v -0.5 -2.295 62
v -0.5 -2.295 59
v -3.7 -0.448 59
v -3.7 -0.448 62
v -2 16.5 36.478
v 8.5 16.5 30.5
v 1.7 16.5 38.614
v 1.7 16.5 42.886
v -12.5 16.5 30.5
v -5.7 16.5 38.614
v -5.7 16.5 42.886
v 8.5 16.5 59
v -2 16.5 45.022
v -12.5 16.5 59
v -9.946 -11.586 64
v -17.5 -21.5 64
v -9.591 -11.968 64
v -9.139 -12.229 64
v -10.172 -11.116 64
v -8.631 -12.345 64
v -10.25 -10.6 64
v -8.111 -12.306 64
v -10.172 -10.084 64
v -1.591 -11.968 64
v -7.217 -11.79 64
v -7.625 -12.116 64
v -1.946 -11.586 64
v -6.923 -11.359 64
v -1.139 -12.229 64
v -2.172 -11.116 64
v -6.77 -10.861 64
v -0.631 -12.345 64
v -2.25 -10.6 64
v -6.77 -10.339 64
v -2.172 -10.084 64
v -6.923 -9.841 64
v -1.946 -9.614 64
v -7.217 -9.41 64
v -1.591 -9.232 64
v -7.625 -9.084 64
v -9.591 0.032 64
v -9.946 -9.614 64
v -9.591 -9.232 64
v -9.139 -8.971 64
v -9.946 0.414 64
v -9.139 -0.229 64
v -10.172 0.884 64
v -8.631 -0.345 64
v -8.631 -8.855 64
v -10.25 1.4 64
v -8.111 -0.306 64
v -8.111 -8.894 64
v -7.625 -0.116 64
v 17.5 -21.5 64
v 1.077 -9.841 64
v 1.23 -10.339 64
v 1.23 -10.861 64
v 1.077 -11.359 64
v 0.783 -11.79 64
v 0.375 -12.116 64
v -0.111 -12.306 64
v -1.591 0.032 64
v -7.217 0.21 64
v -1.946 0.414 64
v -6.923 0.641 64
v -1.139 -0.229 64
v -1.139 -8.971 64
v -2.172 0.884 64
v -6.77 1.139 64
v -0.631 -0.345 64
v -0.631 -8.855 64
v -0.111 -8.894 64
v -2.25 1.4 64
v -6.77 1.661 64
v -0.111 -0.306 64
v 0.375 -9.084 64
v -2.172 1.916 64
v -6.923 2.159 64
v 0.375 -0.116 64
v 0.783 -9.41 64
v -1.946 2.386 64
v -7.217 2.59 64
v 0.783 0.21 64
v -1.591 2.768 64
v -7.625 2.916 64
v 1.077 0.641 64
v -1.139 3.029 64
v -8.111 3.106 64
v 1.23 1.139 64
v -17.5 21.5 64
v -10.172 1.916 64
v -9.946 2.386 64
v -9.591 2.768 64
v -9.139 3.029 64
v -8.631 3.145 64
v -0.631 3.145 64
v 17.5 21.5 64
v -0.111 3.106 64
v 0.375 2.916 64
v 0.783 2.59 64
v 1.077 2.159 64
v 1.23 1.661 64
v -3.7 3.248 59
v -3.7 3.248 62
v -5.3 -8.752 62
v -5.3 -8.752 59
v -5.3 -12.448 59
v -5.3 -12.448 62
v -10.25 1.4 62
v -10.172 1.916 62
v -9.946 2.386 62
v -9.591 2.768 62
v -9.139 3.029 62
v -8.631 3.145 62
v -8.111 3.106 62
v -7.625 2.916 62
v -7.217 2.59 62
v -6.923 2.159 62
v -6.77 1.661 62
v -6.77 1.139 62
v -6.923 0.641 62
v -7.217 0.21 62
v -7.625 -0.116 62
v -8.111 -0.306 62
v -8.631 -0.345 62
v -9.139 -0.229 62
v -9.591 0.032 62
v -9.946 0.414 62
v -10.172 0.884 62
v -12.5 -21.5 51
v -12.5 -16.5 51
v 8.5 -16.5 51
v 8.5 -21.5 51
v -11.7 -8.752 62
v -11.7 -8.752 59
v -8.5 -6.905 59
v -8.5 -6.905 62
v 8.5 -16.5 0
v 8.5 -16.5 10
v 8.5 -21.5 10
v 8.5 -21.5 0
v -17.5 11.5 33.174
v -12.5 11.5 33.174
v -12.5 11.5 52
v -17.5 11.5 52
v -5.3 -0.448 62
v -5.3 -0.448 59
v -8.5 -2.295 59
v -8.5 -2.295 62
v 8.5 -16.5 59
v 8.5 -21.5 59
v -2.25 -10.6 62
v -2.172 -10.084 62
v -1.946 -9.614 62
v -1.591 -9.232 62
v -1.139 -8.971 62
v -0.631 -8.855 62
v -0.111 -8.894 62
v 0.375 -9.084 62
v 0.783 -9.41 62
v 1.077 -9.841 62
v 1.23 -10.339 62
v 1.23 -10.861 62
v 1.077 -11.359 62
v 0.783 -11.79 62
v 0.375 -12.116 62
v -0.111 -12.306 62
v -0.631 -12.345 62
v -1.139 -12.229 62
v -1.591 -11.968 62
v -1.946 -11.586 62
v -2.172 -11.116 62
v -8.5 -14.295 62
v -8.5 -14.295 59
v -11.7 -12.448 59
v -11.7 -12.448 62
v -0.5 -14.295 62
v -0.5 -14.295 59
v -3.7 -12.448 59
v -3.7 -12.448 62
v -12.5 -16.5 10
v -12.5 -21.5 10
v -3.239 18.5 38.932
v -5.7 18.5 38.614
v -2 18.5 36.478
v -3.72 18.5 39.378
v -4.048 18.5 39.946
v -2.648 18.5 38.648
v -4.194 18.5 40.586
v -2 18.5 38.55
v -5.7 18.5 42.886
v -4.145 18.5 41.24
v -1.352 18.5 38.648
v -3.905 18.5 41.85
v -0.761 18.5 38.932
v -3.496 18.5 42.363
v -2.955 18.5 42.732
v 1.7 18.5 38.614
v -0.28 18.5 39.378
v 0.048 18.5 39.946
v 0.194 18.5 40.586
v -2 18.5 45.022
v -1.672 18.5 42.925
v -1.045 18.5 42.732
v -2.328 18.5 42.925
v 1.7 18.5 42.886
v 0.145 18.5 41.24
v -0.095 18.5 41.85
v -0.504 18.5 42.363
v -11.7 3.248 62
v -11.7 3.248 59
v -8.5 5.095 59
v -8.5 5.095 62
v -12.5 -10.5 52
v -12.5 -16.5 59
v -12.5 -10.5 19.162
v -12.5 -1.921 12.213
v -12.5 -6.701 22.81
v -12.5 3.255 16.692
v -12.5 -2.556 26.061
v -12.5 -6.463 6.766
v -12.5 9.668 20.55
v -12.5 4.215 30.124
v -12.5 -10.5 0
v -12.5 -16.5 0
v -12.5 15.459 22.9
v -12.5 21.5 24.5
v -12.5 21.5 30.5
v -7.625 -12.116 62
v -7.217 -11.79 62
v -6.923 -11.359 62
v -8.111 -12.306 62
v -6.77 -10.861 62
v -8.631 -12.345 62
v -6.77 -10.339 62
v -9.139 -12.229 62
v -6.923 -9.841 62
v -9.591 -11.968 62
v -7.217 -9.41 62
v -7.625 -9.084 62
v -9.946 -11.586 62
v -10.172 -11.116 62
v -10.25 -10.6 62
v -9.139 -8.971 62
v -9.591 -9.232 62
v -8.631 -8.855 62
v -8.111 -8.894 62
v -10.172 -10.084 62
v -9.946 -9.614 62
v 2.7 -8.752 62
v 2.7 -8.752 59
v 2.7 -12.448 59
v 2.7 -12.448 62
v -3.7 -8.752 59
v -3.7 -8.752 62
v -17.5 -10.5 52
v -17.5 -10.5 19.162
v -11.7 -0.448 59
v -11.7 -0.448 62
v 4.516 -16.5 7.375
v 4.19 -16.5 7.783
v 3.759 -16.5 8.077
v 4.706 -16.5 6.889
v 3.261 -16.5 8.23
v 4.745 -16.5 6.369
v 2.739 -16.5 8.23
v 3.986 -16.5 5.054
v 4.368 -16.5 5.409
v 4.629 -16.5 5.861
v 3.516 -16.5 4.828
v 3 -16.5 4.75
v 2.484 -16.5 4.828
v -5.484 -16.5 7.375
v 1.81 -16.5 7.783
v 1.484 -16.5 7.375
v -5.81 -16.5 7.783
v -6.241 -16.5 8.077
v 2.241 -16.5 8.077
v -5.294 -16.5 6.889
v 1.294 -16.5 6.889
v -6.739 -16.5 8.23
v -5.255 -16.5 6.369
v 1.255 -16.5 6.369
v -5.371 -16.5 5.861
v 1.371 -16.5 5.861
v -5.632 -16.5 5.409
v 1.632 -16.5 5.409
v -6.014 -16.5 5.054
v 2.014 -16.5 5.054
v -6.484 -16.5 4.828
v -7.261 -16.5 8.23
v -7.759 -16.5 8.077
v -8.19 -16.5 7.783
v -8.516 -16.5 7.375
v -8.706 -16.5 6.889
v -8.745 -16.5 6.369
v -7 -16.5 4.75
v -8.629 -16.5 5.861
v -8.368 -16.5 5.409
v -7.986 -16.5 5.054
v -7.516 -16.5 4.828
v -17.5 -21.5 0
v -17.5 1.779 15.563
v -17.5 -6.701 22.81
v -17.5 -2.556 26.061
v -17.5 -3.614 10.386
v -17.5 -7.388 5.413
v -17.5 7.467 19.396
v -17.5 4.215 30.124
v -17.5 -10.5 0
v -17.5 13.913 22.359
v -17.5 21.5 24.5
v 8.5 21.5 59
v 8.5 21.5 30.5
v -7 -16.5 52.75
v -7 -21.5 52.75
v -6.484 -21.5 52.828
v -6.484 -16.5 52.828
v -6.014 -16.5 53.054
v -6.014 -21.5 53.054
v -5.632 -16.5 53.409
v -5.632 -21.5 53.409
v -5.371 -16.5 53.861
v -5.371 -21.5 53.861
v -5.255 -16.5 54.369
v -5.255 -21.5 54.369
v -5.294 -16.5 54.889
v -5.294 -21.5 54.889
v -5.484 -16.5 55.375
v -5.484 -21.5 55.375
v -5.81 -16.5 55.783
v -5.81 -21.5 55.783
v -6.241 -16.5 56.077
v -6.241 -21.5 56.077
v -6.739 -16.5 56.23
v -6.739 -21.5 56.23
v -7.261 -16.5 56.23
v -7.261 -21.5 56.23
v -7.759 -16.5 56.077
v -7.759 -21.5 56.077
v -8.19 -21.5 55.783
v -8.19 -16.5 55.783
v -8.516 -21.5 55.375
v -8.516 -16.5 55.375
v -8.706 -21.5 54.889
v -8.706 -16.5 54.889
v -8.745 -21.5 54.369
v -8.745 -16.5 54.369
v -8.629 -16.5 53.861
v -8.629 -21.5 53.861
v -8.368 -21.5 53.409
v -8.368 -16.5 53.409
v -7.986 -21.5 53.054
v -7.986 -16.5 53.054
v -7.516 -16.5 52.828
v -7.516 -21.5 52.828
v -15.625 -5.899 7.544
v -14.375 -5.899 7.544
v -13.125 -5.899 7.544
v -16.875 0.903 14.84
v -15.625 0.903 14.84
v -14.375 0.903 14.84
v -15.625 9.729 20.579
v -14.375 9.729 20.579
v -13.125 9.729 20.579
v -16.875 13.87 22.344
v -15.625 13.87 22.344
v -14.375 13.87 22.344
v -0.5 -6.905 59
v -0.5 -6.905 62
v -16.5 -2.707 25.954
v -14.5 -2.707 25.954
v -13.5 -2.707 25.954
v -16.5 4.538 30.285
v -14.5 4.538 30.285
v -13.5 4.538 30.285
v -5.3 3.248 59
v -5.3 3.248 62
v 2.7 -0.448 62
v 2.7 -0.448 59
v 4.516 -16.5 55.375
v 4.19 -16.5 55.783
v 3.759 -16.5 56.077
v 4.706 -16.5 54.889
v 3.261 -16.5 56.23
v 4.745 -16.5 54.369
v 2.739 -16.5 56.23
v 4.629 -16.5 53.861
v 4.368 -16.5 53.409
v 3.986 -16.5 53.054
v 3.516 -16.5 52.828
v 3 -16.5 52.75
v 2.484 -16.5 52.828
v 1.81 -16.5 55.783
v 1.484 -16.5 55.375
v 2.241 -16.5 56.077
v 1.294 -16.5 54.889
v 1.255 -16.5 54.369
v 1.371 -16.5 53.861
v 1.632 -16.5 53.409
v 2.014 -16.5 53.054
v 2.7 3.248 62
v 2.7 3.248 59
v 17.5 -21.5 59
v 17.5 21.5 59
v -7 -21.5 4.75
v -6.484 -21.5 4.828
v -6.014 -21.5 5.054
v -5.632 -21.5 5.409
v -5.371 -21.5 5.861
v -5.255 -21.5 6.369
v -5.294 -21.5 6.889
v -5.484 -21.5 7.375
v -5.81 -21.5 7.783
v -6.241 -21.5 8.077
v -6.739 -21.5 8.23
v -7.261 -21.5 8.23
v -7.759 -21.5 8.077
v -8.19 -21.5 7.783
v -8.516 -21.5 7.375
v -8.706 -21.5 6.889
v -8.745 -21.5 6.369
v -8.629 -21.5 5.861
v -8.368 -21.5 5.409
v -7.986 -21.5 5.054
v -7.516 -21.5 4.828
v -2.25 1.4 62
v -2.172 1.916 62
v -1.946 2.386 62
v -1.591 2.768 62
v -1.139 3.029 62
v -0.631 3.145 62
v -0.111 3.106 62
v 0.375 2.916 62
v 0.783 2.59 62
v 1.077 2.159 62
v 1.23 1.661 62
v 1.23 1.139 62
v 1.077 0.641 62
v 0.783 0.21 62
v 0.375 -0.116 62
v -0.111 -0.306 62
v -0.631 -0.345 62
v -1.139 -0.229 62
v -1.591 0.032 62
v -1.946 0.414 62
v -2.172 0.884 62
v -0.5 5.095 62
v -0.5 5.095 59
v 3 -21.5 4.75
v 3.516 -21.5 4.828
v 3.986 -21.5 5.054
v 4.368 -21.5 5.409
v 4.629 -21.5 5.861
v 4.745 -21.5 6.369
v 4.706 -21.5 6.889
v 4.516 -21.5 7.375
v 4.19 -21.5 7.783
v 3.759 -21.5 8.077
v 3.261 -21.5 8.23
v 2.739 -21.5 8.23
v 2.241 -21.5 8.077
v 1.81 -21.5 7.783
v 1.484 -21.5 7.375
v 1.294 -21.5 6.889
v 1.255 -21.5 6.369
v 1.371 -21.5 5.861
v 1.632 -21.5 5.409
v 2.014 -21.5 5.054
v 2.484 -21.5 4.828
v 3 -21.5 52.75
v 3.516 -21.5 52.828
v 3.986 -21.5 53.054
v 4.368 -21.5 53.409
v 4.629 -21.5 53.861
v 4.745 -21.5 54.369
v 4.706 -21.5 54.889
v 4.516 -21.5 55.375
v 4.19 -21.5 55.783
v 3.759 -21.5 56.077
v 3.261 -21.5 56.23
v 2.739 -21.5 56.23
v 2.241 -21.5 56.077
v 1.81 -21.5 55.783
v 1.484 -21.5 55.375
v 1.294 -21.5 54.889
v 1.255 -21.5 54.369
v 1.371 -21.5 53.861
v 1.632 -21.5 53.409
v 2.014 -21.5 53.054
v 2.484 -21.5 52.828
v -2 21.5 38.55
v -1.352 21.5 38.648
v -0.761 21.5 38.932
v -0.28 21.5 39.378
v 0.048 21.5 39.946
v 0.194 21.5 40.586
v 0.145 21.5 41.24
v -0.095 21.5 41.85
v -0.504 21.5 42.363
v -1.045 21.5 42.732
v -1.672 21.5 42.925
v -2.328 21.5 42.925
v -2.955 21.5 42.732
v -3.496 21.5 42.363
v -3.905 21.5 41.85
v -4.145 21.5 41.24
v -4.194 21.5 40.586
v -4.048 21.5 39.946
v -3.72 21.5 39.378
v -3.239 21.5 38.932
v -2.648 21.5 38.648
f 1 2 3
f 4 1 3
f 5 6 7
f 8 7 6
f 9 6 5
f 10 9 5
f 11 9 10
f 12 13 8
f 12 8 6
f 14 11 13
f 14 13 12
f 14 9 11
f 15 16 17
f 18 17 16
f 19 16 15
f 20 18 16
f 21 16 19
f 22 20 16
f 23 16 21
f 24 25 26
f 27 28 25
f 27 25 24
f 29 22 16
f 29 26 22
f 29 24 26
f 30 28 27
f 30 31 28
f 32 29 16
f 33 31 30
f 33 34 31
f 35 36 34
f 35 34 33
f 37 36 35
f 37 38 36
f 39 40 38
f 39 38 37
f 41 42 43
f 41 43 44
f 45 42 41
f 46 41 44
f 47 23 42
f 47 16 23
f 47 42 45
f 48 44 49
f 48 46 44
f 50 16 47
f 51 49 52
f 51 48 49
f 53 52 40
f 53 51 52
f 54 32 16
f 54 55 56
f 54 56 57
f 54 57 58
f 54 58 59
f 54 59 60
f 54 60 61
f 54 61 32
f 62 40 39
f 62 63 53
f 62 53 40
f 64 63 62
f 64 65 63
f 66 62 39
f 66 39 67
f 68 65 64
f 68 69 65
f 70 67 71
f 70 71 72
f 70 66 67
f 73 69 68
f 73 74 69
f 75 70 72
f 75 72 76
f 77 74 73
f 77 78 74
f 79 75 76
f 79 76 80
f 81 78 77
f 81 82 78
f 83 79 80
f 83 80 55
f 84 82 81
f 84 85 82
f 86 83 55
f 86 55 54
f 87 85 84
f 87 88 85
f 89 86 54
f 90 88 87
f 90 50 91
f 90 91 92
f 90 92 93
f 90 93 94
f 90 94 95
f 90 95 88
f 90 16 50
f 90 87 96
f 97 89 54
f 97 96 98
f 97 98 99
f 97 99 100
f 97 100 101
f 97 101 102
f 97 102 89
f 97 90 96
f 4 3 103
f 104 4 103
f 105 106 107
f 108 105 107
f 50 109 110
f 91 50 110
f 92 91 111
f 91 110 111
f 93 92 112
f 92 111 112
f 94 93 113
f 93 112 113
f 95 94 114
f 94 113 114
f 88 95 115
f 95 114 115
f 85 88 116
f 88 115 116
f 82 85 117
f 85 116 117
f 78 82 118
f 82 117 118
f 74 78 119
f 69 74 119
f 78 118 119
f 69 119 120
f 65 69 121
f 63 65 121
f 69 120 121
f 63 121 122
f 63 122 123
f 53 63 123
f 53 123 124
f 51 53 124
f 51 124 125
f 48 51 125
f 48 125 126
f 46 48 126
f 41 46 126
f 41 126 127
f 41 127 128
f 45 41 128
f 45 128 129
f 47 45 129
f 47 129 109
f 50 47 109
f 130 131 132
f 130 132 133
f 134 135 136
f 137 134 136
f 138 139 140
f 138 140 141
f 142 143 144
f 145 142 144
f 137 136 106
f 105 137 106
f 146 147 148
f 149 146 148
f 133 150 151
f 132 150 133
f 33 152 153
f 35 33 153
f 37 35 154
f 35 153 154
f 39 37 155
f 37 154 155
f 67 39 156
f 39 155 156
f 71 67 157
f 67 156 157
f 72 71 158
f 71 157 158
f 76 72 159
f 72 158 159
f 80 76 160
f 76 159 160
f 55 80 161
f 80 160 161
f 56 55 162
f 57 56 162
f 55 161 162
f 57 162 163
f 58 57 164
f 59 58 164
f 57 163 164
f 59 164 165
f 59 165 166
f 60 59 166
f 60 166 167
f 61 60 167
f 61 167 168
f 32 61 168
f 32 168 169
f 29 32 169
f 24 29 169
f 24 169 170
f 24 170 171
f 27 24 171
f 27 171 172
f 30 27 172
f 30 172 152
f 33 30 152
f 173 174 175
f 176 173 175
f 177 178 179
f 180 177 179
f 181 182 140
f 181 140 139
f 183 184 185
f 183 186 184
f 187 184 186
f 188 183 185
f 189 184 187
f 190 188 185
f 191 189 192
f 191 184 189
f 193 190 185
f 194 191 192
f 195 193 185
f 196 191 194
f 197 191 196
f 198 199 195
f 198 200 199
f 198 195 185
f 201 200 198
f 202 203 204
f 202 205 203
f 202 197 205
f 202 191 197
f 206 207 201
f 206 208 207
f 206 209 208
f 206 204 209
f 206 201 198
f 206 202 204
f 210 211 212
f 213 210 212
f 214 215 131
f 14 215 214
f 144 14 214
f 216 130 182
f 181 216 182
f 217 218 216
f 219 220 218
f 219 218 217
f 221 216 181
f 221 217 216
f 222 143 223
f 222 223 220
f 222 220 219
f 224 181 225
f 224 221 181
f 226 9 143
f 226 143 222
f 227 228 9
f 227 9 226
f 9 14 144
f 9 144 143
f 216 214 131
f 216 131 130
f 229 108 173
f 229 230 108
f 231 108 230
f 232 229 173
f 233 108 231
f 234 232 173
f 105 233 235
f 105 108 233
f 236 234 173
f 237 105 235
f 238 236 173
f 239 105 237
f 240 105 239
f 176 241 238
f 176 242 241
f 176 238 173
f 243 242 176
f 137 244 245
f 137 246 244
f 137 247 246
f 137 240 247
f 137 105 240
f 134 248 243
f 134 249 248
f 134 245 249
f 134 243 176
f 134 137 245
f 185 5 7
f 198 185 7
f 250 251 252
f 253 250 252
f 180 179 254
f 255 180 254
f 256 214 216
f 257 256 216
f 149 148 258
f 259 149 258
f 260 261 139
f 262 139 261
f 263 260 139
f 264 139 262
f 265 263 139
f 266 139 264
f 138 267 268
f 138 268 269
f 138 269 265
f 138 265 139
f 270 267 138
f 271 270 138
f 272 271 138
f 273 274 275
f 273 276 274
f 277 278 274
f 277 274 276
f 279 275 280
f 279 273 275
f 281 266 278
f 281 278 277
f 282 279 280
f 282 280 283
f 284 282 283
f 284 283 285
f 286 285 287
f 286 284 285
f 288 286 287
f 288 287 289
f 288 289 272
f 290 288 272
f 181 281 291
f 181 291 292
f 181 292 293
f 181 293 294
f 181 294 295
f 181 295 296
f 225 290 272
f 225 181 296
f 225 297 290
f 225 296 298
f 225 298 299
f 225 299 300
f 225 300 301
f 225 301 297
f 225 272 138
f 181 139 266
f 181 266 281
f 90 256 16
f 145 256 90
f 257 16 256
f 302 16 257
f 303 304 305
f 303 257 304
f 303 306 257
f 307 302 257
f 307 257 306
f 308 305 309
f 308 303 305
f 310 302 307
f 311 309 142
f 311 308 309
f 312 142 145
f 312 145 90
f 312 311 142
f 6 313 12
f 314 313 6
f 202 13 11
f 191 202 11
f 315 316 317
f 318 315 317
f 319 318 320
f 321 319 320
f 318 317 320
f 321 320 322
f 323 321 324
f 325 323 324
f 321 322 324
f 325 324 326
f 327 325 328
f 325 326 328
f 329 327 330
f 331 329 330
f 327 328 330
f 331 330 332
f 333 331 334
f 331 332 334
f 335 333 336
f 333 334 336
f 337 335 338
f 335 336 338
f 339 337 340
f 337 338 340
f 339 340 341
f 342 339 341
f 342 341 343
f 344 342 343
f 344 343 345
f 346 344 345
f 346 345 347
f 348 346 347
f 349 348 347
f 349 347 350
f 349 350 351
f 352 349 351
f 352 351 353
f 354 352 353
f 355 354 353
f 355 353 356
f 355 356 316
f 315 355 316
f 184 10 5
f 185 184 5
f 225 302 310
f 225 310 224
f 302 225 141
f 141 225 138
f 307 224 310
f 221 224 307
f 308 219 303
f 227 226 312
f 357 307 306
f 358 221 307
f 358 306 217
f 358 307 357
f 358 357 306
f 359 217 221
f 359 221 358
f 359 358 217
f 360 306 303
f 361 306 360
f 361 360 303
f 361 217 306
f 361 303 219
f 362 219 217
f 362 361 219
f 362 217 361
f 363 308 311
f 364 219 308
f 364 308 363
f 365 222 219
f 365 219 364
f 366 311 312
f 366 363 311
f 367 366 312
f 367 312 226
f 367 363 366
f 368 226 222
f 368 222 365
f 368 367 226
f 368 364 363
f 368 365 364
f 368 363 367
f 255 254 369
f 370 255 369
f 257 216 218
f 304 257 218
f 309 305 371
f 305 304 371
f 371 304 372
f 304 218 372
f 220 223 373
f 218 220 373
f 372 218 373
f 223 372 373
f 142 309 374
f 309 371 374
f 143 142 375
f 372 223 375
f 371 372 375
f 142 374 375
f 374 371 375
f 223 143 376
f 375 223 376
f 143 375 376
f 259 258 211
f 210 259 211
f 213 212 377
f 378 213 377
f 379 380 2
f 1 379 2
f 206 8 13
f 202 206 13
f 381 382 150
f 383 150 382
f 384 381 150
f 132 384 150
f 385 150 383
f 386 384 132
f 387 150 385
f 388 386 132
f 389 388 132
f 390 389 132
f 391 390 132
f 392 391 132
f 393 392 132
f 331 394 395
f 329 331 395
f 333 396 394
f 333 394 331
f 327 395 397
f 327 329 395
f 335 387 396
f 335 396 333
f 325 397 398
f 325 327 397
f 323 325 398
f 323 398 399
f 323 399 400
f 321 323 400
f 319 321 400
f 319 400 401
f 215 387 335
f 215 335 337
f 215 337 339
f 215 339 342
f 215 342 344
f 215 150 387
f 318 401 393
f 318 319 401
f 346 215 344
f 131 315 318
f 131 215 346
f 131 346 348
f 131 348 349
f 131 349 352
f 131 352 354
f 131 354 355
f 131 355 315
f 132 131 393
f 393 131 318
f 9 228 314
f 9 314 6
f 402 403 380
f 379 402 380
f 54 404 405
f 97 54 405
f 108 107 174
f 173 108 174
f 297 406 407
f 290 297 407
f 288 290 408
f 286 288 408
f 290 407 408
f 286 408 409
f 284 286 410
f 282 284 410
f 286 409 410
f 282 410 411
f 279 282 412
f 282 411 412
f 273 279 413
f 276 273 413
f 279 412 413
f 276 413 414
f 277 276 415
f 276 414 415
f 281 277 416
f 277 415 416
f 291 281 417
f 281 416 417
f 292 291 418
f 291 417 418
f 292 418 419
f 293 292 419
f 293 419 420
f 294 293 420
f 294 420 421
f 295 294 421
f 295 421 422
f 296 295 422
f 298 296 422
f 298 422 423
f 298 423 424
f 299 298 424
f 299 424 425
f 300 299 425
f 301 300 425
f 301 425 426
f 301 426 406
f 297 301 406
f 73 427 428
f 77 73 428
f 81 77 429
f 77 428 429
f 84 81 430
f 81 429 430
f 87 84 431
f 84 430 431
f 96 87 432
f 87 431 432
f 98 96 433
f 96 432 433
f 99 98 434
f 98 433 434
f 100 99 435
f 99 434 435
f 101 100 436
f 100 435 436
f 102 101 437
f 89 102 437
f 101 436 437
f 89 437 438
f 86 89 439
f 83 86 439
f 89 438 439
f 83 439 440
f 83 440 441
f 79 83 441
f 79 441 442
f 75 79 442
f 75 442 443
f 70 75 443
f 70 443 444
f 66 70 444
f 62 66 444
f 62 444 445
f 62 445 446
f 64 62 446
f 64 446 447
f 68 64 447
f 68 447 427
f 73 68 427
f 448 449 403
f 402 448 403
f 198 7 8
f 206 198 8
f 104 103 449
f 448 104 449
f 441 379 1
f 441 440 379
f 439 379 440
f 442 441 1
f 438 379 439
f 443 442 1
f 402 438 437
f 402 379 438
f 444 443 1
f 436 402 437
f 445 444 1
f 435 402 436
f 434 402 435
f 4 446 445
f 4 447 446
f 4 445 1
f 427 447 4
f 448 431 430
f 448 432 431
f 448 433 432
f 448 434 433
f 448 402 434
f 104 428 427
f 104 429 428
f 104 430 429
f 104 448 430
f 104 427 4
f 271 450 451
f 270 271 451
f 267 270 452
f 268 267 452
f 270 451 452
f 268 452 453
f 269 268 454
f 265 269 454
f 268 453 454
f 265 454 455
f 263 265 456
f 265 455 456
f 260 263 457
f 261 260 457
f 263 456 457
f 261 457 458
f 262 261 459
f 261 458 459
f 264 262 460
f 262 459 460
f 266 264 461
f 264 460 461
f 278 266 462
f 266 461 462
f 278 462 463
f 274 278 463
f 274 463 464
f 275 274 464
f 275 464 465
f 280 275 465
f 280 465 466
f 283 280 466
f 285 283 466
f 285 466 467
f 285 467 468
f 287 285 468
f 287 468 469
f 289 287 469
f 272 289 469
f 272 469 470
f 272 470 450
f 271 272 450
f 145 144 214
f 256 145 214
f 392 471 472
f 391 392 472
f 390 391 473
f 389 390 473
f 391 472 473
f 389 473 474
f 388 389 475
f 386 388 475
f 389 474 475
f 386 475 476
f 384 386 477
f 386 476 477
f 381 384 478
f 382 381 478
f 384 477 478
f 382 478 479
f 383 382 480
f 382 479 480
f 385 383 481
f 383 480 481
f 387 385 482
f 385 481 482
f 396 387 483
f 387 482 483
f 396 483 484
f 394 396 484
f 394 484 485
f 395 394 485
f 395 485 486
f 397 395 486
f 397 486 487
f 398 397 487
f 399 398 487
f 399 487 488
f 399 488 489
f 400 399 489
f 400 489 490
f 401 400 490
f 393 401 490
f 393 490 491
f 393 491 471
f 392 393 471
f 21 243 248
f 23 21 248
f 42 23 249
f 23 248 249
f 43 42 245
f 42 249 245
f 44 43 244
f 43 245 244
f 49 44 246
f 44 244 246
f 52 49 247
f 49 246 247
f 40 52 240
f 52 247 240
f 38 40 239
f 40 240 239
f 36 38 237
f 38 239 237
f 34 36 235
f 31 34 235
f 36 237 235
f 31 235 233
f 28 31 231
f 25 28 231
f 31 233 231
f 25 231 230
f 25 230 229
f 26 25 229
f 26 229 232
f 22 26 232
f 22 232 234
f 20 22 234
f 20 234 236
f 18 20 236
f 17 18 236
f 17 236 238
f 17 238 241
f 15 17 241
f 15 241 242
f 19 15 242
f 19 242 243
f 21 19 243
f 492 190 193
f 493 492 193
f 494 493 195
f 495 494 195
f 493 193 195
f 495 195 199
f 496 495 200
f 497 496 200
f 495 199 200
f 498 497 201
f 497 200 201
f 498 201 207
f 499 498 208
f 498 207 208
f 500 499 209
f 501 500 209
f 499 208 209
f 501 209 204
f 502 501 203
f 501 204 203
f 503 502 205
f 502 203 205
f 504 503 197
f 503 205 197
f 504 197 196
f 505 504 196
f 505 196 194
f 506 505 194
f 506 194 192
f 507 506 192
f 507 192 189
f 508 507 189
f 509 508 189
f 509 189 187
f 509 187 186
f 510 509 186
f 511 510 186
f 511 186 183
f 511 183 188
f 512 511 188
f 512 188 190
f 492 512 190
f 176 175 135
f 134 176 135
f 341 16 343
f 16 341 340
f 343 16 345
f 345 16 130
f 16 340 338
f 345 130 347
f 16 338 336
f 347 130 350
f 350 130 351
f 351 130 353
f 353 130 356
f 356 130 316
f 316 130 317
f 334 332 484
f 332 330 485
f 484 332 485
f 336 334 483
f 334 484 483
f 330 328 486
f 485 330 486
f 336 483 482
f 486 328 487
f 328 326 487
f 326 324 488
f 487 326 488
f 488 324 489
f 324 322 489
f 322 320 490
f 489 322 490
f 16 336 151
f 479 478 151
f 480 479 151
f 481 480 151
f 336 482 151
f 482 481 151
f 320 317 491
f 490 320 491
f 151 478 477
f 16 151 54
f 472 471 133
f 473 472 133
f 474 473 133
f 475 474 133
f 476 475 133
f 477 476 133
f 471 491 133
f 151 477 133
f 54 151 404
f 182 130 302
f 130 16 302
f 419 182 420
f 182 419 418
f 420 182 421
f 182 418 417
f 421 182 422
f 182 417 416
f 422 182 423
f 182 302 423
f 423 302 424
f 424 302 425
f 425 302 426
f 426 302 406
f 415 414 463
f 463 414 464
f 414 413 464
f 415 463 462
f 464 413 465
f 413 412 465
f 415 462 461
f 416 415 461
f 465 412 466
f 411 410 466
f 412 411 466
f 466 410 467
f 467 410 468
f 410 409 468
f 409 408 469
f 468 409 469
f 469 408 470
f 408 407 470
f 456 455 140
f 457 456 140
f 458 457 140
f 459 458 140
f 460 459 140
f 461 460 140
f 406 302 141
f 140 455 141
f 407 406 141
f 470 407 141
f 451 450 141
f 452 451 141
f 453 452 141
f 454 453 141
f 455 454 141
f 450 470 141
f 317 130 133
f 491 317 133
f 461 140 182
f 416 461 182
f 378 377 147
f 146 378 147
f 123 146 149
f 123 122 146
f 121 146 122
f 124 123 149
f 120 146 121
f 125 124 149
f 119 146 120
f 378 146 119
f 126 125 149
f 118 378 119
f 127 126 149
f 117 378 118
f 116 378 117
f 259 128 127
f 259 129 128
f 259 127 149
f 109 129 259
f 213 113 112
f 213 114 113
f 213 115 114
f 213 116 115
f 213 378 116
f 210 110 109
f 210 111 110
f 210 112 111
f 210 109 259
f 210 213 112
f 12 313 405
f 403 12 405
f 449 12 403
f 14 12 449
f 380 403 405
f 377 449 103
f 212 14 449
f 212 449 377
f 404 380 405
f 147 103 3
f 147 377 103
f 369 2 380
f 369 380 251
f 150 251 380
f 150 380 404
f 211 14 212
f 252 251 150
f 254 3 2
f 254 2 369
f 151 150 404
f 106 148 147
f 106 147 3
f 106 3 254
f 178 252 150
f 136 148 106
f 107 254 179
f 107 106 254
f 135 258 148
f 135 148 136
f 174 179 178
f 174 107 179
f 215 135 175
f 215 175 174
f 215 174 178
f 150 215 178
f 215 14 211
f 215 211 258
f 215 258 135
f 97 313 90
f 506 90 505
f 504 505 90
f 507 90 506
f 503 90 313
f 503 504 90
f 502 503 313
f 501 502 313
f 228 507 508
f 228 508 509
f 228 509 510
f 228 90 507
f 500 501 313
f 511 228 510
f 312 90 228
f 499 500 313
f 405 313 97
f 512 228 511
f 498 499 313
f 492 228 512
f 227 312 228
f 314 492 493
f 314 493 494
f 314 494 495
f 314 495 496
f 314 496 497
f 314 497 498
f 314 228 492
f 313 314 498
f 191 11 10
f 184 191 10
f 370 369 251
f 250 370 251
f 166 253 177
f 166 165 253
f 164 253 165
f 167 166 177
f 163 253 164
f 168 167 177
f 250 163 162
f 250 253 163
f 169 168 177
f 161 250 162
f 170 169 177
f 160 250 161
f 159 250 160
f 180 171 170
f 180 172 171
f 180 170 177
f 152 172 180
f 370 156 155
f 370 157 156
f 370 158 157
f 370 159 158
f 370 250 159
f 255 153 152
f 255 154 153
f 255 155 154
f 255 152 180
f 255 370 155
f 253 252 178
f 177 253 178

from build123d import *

# Parameters (mm, degrees)
SKETCH1_W               = 35
SKETCH1_H               = 43
BOSS_EXTRUDE1_DEPTH     = 64
CUT_EXTRUDE1_DEPTH      = 77.04768241
CUT_EXTRUDE1_DEPTH_BACK = 77.04768241
CUT_EXTRUDE2_START      = -9
CUT_EXTRUDE2_DEPTH      = 9
CUT_EXTRUDE3_START      = -21
CUT_EXTRUDE3_DEPTH      = 21
SKETCH5_R               = 1.75
CUT_EXTRUDE4_DEPTH      = 21
CUT_EXTRUDE5_DEPTH      = 3
SKETCH7_R               = 1.75
CUT_EXTRUDE6_DEPTH      = 3
CUT_EXTRUDE7_DEPTH      = 2
SKETCH9_R               = 2.2
CUT_EXTRUDE8_DEPTH      = 78.474189407


# Read off the part's stored shape, not the designer's step: Cut-Extrude2, Cut-Extrude3
with BuildPart() as part:
    # Sketch1 → Boss-Extrude1 (new body)
    with BuildSketch(Plane.XY):
        Rectangle(SKETCH1_W, SKETCH1_H)
    extrude(amount=BOSS_EXTRUDE1_DEPTH)

    # Sketch2 → Cut-Extrude1 (cut, two sides: drawn at the far end of the back side and taken through both)
    with BuildSketch(Plane.ZY.offset(17.5).offset(-CUT_EXTRUDE1_DEPTH_BACK)):
        with BuildLine():
            Line((33.173885888, 11.5), (52, 11.5))
            Line((52, 11.5), (52, -10.5))
            Line((52, -10.5), (19.162446424, -10.499999995))
            add(Edge.make_bspline(
                [(19.162446424, -10.499999995), (20.832699675, -8.924322211), (23.191334331, -6.393604558), (26.156205176, -2.504954915), (28.325520723, 0.825456595), (30.873918563, 5.512287152), (32.363699443, 9.120198936), (33.173885888, 11.5)],
                knots=[0, 0, 0, 0, 0.261534973, 0.392989592, 0.556559744, 0.713681498, 1, 1, 1, 1], degree=3))
        make_face()
        with BuildLine():
            Line((0, -10.5), (0, 21.5))
            Line((0, 21.5), (24.5, 21.5))
            add(Edge.make_bspline(
                [(0, -10.5), (1.410254908, -9.794803553), (3.993077245, -8.365634948), (7.472082945, -6.021166025), (11.139491519, -3.071889035), (14.560754773, 0.394143772), (17.949614827, 4.871331165), (20.454917465, 9.23876326), (22.857889337, 14.900225374), (23.971477933, 18.909511405), (24.5, 21.5)],
                knots=[0, 0, 0, 0, 0.113112972, 0.211522862, 0.300551396, 0.450408793, 0.559434529, 0.702650577, 0.810275993, 1, 1, 1, 1], degree=3))
        make_face()
    extrude(amount=CUT_EXTRUDE1_DEPTH + CUT_EXTRUDE1_DEPTH_BACK, mode=Mode.SUBTRACT)

    # Cut-Extrude2 outline → Cut-Extrude2 (cut)
    with BuildSketch(Plane(origin=(17.5, 0, 0), x_dir=(0, 0, -1), z_dir=(1, 0, 0)).offset(CUT_EXTRUDE2_START)):
        with BuildLine():
            Line((-24.5, 21.5), (-59, 21.5))
            Line((-59, 21.5), (-59, -21.5))
            Line((-59, -21.5), (0, -21.5))
            Line((0, -21.5), (0, -10.5))
            add(Edge.make_bspline(
                [(0, -10.5), (-1.410254908, -9.794803553), (-3.993077245, -8.365634948), (-7.472082945, -6.021166025), (-11.139491519, -3.071889035), (-14.560754773, 0.394143772), (-17.949614827, 4.871331165), (-20.454917465, 9.23876326), (-22.857889337, 14.900225374), (-23.971477933, 18.909511405), (-24.5, 21.5)],
                knots=[0, 0, 0, 0, 0.113112972, 0.211522862, 0.300551396, 0.450408793, 0.559434529, 0.702650577, 0.810275993, 1, 1, 1, 1], degree=3))
        make_face()
        with BuildLine():
            Line((-52, 11.5), (-33.173885888, 11.5))
            add(Edge.make_bspline(
                [(-33.173885888, 11.5), (-32.363699443, 9.120198936), (-30.873918563, 5.512287152), (-28.325520723, 0.825456595), (-26.156205176, -2.504954915), (-23.191334331, -6.393604558), (-20.832699675, -8.924322211), (-19.162446424, -10.499999995)],
                knots=[0, 0, 0, 0, 0.286318502, 0.443440256, 0.607010408, 0.738465027, 1, 1, 1, 1], degree=3))
            Line((-19.162446424, -10.499999995), (-52, -10.5))
            Line((-52, -10.5), (-52, 11.5))
        make_face(mode=Mode.SUBTRACT)
    extrude(amount=CUT_EXTRUDE2_DEPTH, mode=Mode.SUBTRACT)

    # Cut-Extrude3 outline → Cut-Extrude3 (cut)
    with BuildSketch(Plane(origin=(8.5, 0, 0), x_dir=(0, 0, -1), z_dir=(1, 0, 0)).offset(CUT_EXTRUDE3_START)):
        with BuildLine():
            Line((-30.5, 16.5), (-59, 16.5))
            Line((-59, 16.5), (-59, -16.5))
            Line((-59, -16.5), (-51, -16.5))
            Line((-51, -16.5), (-51, -21.5))
            Line((-51, -21.5), (-10, -21.5))
            Line((-10, -21.5), (-10, -16.5))
            Line((-10, -16.5), (0, -16.5))
            Line((0, -16.5), (0, -10.5))
            add(Edge.make_bspline(
                [(0, -10.5), (-1.410254908, -9.794803553), (-3.993077245, -8.365634948), (-7.472082945, -6.021166025), (-11.139491519, -3.071889035), (-14.560754773, 0.394143772), (-17.949614827, 4.871331165), (-20.454917465, 9.23876326), (-22.857889337, 14.900225374), (-23.971477933, 18.909511405), (-24.5, 21.5)],
                knots=[0, 0, 0, 0, 0.113112972, 0.211522862, 0.300551396, 0.450408793, 0.559434529, 0.702650577, 0.810275993, 1, 1, 1, 1], degree=3))
            Line((-24.5, 21.5), (-30.5, 21.5))
            Line((-30.5, 21.5), (-30.5, 16.5))
        make_face()
        with BuildLine():
            Line((-52, 11.5), (-33.173885888, 11.5))
            add(Edge.make_bspline(
                [(-33.173885888, 11.5), (-32.363699443, 9.120198936), (-30.873918563, 5.512287152), (-28.325520723, 0.825456595), (-26.156205176, -2.504954915), (-23.191334331, -6.393604558), (-20.832699675, -8.924322211), (-19.162446424, -10.499999995)],
                knots=[0, 0, 0, 0, 0.286318502, 0.443440256, 0.607010408, 0.738465027, 1, 1, 1, 1], degree=3))
            Line((-19.162446424, -10.499999995), (-52, -10.5))
            Line((-52, -10.5), (-52, 11.5))
        make_face(mode=Mode.SUBTRACT)
    extrude(amount=CUT_EXTRUDE3_DEPTH, mode=Mode.SUBTRACT)

    # Sketch5 → Cut-Extrude4 (cut)
    with BuildSketch(Plane.XZ.offset(21.5)):
        with Locations(Location((3, 54.5, 0), (0, 0, 270))):
            Circle(SKETCH5_R)
        with Locations(Location((-7, 54.5, 0), (0, 0, 270))):
            Circle(SKETCH5_R)
        with Locations(Location((-7, 6.5, 0), (0, 0, 270))):
            Circle(SKETCH5_R)
        with Locations(Location((3, 6.5, 0), (0, 0, 270))):
            Circle(SKETCH5_R)
    extrude(amount=-CUT_EXTRUDE4_DEPTH, mode=Mode.SUBTRACT)

    # Sketch6 → Cut-Extrude5 (cut)
    with BuildSketch(Plane(origin=(0, 0, 59), x_dir=(-1, 0, 0), z_dir=(0, 0, -1))):
        Polygon((0.5, 5.095041723), (-2.7, 3.247520861), (-2.7, -0.447520861), (0.5, -2.295041723), (3.7, -0.447520861), (3.7, 3.247520861), align=None)
        Polygon((8.5, 5.095041723), (5.3, 3.247520861), (5.3, -0.447520861), (8.5, -2.295041723), (11.7, -0.447520861), (11.7, 3.247520861), align=None)
        Polygon((8.5, -6.904958277), (5.3, -8.752479139), (5.3, -12.447520861), (8.5, -14.295041723), (11.7, -12.447520861), (11.7, -8.752479139), align=None)
        Polygon((0.5, -6.904958277), (-2.7, -8.752479139), (-2.7, -12.447520861), (0.5, -14.295041723), (3.7, -12.447520861), (3.7, -8.752479139), align=None)
    extrude(amount=-CUT_EXTRUDE5_DEPTH, mode=Mode.SUBTRACT)

    # Sketch7 → Cut-Extrude6 (cut)
    with BuildSketch(Plane(origin=(0, 0, 62), x_dir=(-1, 0, 0), z_dir=(0, 0, -1))):
        with Locations((0.5, 1.4)):
            Circle(SKETCH7_R)
        with Locations((8.5, 1.4)):
            Circle(SKETCH7_R)
        with Locations((8.5, -10.6)):
            Circle(SKETCH7_R)
        with Locations((0.5, -10.6)):
            Circle(SKETCH7_R)
    extrude(amount=-CUT_EXTRUDE6_DEPTH, mode=Mode.SUBTRACT)

    # Sketch8 → Cut-Extrude7 (cut)
    with BuildSketch(Plane.XZ.offset(-16.5)):
        Polygon((1.7, 38.613804004), (1.7, 42.886195996), (-2, 45.022391992), (-5.7, 42.886195996), (-5.7, 38.613804004), (-2, 36.477608008), align=None)
    extrude(amount=-CUT_EXTRUDE7_DEPTH, mode=Mode.SUBTRACT)

    # Sketch9 → Cut-Extrude8 (cut, through all)
    with BuildSketch(Plane(origin=(0, 18.5, 0), x_dir=(-1, 0, 0), z_dir=(0, -1, 0))):
        with Locations(Location((2, -40.75, 0), (0, 0, 90))):
            Circle(SKETCH9_R)
    extrude(amount=-CUT_EXTRUDE8_DEPTH, mode=Mode.SUBTRACT)


solid = part.part
